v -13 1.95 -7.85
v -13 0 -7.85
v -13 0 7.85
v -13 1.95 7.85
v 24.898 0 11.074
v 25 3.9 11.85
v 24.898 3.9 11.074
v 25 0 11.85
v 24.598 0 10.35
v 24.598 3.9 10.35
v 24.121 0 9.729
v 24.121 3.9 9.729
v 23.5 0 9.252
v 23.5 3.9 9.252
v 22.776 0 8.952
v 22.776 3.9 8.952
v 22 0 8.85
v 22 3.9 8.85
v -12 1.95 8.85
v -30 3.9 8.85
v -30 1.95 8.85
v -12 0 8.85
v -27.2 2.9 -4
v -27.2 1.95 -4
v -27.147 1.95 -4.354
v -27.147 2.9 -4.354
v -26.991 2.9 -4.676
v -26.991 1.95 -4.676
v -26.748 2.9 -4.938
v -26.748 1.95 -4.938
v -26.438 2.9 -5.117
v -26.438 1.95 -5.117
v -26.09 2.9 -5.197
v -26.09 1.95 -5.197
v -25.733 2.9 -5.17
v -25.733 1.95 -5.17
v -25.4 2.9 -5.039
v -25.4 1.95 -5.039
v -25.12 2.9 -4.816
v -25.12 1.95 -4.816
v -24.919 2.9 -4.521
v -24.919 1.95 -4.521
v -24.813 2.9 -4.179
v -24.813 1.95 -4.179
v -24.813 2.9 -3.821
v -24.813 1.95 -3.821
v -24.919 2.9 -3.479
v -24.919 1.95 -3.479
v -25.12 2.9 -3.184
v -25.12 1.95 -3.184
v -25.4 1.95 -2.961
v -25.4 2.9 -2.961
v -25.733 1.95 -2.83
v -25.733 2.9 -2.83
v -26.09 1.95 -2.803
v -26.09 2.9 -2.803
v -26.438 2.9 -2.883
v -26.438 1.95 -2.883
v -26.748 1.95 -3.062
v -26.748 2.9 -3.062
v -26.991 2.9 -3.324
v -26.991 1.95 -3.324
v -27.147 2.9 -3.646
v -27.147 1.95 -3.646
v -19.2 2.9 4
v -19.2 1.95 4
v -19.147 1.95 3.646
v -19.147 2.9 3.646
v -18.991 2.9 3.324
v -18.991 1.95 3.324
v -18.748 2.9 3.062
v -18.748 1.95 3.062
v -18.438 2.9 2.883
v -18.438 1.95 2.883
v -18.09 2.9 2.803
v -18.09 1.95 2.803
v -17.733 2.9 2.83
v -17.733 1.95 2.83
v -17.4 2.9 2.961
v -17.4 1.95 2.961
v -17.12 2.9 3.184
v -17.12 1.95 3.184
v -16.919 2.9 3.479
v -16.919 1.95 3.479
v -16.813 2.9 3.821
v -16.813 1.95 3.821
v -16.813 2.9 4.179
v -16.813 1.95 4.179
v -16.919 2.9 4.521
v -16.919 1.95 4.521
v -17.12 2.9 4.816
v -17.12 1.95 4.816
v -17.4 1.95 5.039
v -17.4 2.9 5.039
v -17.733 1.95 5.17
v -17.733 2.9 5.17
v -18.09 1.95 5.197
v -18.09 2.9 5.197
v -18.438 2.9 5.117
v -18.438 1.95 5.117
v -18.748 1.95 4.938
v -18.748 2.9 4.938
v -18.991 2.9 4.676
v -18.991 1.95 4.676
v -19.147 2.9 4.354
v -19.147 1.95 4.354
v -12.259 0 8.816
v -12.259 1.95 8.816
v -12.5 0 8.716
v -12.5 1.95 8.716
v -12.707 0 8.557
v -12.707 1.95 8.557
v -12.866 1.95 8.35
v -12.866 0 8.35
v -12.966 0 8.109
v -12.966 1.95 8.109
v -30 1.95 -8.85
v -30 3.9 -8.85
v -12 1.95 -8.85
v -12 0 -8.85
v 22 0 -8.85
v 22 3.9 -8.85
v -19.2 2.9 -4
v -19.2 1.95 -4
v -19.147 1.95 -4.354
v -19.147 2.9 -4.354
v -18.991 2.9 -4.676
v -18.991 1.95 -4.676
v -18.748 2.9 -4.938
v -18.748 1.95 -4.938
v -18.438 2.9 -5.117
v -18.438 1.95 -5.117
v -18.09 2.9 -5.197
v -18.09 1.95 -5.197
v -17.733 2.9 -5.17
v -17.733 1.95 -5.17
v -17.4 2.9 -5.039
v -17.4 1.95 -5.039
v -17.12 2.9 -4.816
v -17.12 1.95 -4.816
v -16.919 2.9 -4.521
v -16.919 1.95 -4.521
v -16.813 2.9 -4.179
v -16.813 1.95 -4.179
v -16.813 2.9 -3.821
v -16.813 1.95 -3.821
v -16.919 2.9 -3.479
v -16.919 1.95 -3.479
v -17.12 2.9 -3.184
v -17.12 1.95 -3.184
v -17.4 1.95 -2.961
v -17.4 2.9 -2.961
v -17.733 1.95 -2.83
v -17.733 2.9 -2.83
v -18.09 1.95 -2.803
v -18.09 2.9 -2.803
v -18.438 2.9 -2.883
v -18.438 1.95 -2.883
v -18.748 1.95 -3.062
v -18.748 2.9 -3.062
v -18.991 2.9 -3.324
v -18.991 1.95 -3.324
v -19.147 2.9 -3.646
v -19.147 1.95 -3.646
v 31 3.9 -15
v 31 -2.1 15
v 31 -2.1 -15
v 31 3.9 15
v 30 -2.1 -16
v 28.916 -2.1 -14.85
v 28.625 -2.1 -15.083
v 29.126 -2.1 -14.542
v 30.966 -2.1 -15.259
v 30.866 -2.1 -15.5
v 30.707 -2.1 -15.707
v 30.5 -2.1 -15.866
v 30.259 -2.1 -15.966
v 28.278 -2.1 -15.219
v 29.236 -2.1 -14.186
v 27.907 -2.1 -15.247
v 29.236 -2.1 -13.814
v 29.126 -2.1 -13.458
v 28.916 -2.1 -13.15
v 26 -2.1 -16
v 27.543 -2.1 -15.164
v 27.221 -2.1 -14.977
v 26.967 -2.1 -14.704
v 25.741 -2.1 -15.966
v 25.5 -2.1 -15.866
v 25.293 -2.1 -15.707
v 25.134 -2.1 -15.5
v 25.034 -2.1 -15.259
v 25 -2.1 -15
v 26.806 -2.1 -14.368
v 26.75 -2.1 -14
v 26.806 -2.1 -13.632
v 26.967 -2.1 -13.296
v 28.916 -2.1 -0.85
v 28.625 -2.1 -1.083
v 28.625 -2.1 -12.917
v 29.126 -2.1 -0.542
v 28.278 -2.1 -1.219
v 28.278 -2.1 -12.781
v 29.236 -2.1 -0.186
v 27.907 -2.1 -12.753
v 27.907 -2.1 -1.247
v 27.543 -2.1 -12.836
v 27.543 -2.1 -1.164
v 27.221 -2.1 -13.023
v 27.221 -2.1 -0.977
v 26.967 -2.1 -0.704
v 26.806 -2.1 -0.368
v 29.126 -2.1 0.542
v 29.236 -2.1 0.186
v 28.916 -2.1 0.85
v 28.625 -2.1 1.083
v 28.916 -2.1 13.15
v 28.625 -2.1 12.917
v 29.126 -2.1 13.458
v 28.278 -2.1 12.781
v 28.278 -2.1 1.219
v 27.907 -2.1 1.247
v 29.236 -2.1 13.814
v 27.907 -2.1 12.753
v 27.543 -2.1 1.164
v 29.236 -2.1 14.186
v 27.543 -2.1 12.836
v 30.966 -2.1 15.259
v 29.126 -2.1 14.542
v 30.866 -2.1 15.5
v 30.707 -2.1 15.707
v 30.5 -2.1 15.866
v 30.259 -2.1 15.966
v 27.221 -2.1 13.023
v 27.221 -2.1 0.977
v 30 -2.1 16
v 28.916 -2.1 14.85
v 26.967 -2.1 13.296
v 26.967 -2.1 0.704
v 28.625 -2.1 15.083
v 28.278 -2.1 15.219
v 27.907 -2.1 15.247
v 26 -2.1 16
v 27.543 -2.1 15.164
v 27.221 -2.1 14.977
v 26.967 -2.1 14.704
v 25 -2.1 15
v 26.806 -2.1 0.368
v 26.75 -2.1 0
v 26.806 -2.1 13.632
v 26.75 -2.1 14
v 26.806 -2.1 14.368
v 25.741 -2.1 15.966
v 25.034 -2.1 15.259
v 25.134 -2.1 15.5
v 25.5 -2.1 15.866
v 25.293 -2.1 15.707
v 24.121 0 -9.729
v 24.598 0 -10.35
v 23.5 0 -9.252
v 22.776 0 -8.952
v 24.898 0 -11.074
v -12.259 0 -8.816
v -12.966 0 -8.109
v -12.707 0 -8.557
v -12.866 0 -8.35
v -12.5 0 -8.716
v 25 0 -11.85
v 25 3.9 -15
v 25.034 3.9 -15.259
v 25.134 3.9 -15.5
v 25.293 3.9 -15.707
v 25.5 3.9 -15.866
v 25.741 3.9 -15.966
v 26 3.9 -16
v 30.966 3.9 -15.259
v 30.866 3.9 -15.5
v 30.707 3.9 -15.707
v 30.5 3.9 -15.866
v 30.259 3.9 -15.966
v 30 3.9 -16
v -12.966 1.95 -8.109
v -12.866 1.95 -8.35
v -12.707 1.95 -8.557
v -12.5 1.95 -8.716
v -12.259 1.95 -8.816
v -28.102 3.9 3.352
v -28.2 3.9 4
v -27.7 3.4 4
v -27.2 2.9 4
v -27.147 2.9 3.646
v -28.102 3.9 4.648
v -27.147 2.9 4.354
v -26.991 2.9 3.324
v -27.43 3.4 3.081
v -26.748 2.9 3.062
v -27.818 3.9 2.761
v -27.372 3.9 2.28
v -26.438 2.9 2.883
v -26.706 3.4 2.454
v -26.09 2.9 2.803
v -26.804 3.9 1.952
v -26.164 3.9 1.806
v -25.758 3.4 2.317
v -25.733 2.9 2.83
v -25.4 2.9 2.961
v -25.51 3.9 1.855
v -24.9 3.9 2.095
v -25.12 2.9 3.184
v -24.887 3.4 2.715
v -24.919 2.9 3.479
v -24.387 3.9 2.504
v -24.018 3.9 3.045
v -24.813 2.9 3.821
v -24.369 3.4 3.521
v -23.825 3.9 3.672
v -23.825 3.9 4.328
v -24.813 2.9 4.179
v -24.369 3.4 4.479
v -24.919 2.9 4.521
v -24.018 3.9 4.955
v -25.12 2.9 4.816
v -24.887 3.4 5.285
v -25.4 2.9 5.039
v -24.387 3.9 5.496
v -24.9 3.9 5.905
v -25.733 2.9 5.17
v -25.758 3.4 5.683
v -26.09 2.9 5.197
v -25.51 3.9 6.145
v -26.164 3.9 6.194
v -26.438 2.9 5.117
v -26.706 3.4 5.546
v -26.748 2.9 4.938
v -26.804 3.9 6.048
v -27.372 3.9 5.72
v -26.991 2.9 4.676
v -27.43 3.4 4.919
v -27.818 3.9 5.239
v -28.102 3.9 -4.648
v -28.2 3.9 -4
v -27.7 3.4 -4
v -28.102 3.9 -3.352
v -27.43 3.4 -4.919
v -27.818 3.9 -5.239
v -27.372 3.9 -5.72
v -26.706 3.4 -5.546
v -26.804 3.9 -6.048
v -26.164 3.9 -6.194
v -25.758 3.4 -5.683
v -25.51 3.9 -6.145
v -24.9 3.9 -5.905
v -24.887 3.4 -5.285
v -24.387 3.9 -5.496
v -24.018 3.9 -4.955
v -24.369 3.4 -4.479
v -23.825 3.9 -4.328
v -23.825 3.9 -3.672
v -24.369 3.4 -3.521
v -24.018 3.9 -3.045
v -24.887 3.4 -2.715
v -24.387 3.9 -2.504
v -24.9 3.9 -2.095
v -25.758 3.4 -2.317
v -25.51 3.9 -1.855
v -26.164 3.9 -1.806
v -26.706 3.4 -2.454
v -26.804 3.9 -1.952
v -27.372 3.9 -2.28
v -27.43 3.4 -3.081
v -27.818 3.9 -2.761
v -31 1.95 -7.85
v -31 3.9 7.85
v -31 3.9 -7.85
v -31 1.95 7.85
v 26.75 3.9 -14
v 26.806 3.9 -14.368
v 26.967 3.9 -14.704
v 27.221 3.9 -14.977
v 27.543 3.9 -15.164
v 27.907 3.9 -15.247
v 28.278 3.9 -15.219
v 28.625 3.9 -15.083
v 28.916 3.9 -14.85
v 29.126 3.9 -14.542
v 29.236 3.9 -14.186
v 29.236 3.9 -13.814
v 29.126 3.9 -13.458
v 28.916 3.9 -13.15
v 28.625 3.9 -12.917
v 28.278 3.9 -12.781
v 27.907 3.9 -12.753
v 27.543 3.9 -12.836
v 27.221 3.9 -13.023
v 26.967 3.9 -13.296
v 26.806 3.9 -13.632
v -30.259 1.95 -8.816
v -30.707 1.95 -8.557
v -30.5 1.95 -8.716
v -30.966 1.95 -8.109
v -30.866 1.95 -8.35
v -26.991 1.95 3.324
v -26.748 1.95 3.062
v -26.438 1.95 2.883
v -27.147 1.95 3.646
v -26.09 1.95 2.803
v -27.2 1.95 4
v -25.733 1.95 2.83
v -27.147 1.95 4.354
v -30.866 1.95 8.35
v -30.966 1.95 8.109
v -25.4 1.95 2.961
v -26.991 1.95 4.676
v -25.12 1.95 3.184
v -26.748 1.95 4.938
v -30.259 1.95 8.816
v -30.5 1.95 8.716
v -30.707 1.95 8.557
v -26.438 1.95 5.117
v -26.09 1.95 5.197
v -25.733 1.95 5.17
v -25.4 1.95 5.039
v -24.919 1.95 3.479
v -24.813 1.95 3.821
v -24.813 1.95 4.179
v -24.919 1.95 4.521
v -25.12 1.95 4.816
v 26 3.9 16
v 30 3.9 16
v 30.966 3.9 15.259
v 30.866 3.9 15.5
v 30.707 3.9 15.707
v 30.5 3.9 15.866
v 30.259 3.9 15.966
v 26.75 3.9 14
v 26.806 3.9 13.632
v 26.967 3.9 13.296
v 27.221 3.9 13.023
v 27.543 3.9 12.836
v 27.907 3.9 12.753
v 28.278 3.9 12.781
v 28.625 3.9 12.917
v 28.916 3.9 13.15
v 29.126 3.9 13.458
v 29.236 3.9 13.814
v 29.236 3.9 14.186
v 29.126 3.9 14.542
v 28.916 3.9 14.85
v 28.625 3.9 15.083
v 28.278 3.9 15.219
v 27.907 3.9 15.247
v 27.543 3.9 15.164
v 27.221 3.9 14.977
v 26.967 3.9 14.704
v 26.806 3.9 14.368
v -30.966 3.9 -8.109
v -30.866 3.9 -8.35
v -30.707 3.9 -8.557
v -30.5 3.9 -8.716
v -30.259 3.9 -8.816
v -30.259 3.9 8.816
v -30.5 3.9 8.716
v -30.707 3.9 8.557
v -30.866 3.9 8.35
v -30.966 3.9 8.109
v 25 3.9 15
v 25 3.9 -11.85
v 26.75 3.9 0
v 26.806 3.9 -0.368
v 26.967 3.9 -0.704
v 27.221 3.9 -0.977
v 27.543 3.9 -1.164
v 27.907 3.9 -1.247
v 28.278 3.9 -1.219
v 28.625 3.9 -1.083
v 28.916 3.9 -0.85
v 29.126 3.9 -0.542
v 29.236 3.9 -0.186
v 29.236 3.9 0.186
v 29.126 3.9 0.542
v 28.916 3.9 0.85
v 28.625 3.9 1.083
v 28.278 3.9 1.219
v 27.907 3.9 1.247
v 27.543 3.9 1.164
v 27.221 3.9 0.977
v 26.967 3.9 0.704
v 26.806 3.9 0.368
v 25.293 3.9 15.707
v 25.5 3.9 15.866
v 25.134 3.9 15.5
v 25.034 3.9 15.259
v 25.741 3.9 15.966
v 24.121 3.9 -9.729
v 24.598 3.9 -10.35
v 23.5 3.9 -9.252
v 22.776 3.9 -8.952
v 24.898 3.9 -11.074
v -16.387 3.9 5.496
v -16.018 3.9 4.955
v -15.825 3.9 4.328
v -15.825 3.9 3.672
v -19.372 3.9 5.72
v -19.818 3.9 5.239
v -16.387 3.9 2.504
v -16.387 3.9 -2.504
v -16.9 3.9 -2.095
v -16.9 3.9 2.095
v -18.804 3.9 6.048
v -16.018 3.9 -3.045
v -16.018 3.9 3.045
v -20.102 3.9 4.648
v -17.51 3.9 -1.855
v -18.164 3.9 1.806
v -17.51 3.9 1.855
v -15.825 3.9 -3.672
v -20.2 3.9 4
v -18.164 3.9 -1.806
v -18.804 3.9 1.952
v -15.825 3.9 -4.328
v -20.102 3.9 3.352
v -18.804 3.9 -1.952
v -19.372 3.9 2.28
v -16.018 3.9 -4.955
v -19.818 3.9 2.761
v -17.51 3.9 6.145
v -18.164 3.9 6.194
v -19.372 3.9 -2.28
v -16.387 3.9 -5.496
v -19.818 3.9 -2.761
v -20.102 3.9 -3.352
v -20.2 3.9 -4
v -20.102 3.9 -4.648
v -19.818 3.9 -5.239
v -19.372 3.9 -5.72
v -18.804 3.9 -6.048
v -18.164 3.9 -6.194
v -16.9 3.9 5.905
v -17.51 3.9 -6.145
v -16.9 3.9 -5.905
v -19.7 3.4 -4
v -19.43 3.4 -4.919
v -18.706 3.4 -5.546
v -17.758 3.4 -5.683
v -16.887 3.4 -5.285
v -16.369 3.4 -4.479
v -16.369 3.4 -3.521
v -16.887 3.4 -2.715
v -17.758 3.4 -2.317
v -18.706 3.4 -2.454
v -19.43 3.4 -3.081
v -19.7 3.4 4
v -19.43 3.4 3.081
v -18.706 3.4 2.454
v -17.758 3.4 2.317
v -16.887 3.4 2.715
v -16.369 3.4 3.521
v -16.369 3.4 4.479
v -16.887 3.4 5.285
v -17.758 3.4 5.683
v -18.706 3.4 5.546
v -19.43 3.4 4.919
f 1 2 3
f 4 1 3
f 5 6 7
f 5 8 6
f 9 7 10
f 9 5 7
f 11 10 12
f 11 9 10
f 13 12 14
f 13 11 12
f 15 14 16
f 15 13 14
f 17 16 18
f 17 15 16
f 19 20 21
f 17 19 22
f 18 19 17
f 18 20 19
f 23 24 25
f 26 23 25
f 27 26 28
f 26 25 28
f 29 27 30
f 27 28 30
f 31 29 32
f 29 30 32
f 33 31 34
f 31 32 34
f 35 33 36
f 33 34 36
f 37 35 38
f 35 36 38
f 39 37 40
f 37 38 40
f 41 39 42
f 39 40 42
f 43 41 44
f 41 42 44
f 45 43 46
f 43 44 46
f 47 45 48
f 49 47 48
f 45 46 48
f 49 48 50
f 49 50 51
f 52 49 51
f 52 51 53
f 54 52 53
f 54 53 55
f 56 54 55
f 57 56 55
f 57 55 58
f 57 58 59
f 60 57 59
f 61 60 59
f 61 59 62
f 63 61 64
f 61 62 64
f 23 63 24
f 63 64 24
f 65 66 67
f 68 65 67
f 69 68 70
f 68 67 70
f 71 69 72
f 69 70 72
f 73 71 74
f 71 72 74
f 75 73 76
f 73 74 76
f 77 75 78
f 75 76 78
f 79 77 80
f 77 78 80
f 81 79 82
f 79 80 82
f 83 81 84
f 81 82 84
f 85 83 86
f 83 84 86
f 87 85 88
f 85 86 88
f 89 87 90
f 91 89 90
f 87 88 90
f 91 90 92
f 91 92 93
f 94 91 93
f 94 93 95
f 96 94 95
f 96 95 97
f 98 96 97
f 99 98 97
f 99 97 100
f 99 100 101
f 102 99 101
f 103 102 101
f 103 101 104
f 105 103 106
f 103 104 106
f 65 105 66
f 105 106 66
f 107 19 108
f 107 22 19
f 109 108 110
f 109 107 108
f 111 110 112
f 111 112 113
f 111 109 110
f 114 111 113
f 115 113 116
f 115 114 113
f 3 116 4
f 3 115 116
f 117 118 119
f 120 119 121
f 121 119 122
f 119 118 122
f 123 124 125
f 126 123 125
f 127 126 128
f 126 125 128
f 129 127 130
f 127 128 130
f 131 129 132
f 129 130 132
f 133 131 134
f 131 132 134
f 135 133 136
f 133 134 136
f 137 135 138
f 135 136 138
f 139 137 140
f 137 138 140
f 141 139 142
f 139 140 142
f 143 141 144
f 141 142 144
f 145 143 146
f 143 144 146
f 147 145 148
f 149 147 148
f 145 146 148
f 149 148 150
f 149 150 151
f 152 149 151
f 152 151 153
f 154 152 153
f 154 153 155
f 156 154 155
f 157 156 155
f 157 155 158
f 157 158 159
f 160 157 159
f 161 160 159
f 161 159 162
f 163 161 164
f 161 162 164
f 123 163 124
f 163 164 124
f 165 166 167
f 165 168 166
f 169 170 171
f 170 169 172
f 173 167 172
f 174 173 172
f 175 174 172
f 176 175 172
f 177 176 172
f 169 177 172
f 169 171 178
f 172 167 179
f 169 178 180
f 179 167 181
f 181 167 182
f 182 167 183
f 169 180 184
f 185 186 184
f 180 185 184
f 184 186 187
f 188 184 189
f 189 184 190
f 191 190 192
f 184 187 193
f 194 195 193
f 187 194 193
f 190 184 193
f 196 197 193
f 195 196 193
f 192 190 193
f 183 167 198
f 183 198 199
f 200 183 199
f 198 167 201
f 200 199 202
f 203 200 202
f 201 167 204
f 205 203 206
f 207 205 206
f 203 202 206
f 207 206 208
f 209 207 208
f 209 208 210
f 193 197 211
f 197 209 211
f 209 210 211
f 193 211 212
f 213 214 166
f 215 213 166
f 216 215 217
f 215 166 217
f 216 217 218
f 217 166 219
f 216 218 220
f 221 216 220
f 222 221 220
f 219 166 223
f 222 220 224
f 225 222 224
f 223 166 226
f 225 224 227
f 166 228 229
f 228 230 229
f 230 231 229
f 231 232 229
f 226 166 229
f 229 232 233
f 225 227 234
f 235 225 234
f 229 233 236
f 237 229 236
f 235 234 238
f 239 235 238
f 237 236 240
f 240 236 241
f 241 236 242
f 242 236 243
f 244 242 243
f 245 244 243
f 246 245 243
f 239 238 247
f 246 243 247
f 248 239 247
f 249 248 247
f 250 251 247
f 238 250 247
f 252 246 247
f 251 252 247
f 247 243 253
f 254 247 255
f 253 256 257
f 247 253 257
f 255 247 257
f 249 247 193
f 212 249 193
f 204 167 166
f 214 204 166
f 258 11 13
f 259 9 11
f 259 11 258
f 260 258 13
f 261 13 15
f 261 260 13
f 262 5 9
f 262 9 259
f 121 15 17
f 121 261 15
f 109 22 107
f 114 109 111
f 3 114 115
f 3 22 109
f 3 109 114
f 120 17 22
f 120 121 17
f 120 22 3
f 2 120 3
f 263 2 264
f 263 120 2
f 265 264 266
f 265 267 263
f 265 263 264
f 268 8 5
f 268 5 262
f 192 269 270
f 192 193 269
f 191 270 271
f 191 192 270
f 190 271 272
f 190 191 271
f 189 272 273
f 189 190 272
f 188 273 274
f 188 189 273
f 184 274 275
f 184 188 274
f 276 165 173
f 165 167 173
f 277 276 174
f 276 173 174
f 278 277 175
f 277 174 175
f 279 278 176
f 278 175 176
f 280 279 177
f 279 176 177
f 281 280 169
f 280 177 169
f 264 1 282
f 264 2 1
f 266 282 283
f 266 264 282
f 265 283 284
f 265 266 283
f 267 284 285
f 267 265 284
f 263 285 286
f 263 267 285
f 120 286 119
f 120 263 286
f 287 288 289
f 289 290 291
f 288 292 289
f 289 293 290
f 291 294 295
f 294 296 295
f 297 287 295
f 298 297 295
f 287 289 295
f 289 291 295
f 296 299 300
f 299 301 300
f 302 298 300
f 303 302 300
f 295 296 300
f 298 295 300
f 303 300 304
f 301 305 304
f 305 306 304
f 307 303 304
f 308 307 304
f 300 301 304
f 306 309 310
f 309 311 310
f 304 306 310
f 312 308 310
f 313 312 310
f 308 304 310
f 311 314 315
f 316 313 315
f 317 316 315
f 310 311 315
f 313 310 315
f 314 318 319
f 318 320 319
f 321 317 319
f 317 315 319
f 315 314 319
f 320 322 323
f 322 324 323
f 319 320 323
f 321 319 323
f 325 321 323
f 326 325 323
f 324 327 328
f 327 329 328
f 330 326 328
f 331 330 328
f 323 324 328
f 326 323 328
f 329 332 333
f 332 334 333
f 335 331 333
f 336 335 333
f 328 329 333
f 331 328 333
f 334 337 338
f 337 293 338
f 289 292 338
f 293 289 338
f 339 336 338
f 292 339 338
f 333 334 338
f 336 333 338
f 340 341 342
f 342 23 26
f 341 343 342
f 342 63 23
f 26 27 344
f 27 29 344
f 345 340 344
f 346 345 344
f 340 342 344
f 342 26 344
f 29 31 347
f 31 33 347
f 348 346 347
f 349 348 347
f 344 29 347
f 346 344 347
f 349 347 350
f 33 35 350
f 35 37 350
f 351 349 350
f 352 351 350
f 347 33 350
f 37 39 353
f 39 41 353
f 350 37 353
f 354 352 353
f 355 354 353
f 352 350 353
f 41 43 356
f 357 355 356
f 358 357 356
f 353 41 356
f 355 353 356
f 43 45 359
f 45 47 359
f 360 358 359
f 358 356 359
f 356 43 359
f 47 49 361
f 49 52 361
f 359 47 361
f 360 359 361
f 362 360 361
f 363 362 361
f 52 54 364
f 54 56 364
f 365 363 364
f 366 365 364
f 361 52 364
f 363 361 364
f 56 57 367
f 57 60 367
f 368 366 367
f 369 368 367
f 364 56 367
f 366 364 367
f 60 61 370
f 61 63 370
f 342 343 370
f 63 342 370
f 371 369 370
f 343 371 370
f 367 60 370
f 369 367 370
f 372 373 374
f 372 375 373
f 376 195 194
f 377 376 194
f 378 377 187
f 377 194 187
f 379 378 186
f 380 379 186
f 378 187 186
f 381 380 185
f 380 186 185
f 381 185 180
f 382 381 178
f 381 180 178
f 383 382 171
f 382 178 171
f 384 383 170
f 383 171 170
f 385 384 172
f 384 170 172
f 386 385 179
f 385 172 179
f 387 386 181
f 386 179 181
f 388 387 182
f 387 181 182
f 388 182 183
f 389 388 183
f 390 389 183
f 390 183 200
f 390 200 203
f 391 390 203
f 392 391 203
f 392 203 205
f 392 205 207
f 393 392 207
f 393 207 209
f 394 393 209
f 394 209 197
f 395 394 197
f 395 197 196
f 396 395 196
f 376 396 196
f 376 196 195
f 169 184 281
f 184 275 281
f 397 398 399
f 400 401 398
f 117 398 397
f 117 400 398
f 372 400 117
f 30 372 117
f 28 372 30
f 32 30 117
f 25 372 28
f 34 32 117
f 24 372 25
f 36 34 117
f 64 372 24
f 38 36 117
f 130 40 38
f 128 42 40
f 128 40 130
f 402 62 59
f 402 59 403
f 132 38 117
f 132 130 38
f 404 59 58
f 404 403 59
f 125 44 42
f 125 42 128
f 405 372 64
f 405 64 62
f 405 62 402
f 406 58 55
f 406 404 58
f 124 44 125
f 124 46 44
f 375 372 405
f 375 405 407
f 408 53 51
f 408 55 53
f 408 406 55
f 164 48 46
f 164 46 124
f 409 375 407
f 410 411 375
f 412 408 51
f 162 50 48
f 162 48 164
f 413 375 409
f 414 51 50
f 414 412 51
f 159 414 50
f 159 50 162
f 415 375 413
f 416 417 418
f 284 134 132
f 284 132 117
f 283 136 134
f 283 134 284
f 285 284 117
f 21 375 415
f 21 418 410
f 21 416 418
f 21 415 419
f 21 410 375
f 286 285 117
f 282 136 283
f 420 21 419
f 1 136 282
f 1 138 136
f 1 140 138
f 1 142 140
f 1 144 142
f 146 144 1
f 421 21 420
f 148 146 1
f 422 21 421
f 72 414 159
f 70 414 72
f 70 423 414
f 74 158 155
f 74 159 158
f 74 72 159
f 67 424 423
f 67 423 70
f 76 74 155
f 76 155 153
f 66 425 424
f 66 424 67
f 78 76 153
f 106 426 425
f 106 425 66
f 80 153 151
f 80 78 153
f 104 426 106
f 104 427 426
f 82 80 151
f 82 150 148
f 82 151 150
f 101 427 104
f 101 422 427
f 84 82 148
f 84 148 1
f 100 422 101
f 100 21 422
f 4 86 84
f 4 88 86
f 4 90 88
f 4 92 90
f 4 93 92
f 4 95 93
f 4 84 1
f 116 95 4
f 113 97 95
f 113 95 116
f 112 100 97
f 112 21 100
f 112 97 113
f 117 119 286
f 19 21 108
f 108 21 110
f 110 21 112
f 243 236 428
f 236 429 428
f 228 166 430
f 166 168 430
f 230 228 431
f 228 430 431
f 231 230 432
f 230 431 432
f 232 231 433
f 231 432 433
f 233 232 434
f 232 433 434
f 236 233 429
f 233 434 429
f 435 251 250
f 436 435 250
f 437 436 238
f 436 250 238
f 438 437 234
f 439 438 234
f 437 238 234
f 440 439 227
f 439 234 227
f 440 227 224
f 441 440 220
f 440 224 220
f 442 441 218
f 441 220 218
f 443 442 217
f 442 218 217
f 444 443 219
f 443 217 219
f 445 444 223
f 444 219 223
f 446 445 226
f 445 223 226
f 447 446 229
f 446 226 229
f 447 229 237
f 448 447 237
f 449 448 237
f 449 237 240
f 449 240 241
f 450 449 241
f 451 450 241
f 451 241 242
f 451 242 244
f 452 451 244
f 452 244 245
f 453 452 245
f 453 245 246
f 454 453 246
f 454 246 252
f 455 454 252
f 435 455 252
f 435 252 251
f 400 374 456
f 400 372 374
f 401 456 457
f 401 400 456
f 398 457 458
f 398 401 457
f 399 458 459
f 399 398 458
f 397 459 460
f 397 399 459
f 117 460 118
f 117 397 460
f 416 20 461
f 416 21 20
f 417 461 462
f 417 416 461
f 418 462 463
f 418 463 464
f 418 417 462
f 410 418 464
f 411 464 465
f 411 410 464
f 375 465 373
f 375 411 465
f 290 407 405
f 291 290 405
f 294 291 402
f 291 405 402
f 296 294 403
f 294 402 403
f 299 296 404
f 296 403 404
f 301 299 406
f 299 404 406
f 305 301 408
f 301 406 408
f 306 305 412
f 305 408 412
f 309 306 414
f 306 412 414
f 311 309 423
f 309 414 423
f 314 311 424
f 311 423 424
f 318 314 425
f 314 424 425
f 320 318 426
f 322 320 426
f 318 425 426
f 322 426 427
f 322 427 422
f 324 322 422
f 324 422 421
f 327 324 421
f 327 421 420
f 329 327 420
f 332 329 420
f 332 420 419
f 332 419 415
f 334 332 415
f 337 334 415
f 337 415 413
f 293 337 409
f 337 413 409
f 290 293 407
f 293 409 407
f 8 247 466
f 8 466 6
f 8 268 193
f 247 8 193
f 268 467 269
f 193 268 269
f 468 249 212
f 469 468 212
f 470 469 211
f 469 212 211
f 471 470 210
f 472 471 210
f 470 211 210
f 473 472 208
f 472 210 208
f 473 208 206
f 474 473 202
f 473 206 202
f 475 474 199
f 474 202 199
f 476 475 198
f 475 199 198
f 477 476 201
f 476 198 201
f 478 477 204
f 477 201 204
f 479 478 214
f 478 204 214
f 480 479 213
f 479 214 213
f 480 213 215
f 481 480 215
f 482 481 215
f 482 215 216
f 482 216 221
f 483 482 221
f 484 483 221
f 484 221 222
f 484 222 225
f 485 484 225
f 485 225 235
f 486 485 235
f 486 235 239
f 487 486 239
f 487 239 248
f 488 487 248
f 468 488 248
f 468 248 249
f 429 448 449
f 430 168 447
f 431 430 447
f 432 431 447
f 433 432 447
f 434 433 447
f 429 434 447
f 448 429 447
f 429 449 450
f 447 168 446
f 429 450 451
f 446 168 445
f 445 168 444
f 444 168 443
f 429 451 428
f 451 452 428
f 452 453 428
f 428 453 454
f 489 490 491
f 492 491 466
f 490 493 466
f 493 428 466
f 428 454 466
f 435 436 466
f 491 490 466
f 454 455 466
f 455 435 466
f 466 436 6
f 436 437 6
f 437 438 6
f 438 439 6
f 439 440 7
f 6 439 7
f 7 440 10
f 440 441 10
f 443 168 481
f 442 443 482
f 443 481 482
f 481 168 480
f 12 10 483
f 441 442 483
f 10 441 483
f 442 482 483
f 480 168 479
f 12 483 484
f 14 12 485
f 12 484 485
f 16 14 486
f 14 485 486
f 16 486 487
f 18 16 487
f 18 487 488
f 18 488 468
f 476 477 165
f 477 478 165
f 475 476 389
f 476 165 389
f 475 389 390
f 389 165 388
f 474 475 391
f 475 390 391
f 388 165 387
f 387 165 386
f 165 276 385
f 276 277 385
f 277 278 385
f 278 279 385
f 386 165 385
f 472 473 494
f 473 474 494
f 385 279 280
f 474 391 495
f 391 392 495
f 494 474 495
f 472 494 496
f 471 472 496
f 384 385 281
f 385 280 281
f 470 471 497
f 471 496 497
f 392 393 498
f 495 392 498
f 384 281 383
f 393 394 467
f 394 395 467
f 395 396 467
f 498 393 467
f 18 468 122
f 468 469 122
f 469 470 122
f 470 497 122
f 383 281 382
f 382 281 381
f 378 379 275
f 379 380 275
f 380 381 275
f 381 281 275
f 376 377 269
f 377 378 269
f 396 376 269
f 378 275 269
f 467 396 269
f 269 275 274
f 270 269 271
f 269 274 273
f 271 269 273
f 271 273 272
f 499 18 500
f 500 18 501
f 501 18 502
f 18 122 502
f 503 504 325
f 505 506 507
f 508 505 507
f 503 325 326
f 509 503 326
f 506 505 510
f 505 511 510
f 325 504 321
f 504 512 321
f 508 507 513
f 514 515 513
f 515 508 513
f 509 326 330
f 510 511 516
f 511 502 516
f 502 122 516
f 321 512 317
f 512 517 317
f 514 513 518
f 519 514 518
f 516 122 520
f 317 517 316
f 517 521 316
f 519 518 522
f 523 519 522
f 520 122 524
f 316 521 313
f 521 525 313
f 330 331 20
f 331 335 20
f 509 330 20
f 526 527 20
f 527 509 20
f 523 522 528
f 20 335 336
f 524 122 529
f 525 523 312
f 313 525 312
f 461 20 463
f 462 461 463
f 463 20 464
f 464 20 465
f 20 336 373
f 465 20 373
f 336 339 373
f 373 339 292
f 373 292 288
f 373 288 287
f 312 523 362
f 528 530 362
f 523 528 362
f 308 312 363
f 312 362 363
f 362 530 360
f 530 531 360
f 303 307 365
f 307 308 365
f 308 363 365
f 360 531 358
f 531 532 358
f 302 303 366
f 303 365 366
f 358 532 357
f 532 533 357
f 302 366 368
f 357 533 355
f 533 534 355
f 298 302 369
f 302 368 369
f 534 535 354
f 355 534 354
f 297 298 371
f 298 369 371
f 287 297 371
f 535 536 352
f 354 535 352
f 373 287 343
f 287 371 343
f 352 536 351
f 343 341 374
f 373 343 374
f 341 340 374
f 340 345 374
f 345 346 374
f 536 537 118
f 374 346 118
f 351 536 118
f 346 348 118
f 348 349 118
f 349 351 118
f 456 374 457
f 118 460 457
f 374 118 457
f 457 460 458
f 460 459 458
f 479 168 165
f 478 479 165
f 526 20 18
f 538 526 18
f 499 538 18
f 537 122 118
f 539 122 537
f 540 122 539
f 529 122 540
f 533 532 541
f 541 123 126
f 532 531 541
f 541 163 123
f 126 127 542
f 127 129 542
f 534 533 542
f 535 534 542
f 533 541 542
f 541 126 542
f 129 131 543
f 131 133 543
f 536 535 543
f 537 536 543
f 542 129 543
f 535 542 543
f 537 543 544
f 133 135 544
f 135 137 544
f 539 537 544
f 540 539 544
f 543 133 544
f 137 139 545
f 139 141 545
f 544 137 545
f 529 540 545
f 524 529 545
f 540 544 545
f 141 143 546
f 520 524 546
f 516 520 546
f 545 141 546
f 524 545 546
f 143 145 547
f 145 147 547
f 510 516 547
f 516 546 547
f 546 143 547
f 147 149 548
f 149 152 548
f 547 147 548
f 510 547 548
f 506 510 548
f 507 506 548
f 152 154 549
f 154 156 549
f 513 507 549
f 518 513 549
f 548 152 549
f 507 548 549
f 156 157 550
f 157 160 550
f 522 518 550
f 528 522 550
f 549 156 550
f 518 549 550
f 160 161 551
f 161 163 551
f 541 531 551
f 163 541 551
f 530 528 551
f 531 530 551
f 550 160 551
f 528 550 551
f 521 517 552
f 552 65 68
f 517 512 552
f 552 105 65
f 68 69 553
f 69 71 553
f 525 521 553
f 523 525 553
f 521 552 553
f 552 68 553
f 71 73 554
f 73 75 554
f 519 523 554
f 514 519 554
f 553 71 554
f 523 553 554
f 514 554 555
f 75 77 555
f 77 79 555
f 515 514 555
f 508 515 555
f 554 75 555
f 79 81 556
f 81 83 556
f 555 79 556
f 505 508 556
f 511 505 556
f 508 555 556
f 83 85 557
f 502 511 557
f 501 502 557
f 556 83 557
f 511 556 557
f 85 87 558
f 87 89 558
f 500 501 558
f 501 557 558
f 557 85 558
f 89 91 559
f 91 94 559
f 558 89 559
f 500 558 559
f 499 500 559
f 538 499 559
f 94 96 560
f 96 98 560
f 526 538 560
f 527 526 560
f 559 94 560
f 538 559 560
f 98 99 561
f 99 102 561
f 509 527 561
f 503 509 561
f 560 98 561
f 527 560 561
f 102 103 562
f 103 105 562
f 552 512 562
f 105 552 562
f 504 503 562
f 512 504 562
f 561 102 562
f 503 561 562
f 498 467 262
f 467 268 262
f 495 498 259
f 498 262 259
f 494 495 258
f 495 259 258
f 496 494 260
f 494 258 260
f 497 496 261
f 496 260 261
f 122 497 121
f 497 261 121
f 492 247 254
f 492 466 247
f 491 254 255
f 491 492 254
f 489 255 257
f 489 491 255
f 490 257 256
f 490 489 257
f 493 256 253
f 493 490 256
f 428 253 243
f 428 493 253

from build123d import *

# Parameters (mm, degrees)
BOSS_EXTRUDE1_DEPTH                                 = 3.9
BOSS_EXTRUDE2_DEPTH                                 = 2.1
CSK_FOR_M2_COUNTERSUNK_FLAT_HEAD_SCREW1_D           = 2.4
CSK_FOR_M2_COUNTERSUNK_FLAT_HEAD_SCREW1_CSINK_D     = 4.4
CSK_FOR_M2_COUNTERSUNK_FLAT_HEAD_SCREW1_CSINK_ANGLE = 90
LPATTERN1_COUNT                                     = 2
LPATTERN1_PITCH                                     = 8
LPATTERN1_COUNT_DIR2                                = 2
LPATTERN1_PITCH_DIR2                                = 8
SKETCH7_W                                           = 8
SKETCH7_H                                           = 6
CUT_EXTRUDE1_DEPTH                                  = 36.397740041
SKETCH10_W                                          = 18
SKETCH10_H                                          = 18
CUT_EXTRUDE2_DEPTH                                  = 1.95
SKETCH14_W                                          = 8
SKETCH14_H                                          = 1
CUT_EXTRUDE3_DEPTH                                  = 36.11983058
M3_TAPPED_HOLE1_D                                   = 2.5
M3_TAPPED_HOLE1_DEPTH                               = 6.748924226
M3_TAPPED_HOLE1_TIP                                 = 0.751075774
SKETCH15_W                                          = 56
SKETCH15_H                                          = 3.05
CUT_EXTRUDE4_DEPTH                                  = 36.397740041
FILLET5_R                                           = 1
FILLET7_R                                           = 3


with BuildPart() as part:
    # Sketch1 → Boss-Extrude1 (new body)
    with BuildSketch(Plane(origin=(0, 0, 0), x_dir=(1, 0, 0), z_dir=(0, 1, 0))):
        Polygon((22, 11.9), (25, 11.9), (25, 16), (28, 16), (31, 16), (31, -16), (28, -16), (25, -16), (25, -11.9), (22, -11.9), (-31, -11.9), (-31, 11.9), align=None)
    extrude(amount=BOSS_EXTRUDE1_DEPTH)

    # Sketch6 → Boss-Extrude2 (add)
    with BuildSketch(Plane.XZ):
        Polygon((25, 11.9), (25, 16), (28, 16), (31, 16), (31, -16), (28, -16), (25, -16), (25, -11.9), align=None)
    extrude(amount=BOSS_EXTRUDE2_DEPTH)

    # CSK for M2 Countersunk Flat Head Screw1 (through all)
    with Locations(Plane(origin=(0, 3.9, 0), x_dir=(1, 0, 0), z_dir=(0, 1, 0))):
        with Locations((-18, 4)):
            csk_for_m2_countersunk_flat_head_screw1 = CounterSinkHole(CSK_FOR_M2_COUNTERSUNK_FLAT_HEAD_SCREW1_D / 2, CSK_FOR_M2_COUNTERSUNK_FLAT_HEAD_SCREW1_CSINK_D / 2, counter_sink_angle=CSK_FOR_M2_COUNTERSUNK_FLAT_HEAD_SCREW1_CSINK_ANGLE)

    # LPattern1: CSK for M2 Countersunk Flat Head Screw1 2 × 2
    with Locations(*[(-i * LPATTERN1_PITCH, 0, j * LPATTERN1_PITCH_DIR2) for i in range(LPATTERN1_COUNT) for j in range(LPATTERN1_COUNT_DIR2) if (i, j) != (0, 0)]):
        add(csk_for_m2_countersunk_flat_head_screw1, mode=Mode.SUBTRACT)

    # Sketch7 → Cut-Extrude1 (cut, through all)
    with BuildSketch(Plane(origin=(0, 3.9, 0), x_dir=(1, 0, 0), z_dir=(0, 1, 0))):
        with Locations((-27, 12)):
            Rectangle(SKETCH7_W, SKETCH7_H)
        with Locations((-27, -12)):
            Rectangle(SKETCH7_W, SKETCH7_H)
    extrude(amount=-CUT_EXTRUDE1_DEPTH, mode=Mode.SUBTRACT)

    # Sketch10 → Cut-Extrude2 (cut)
    with BuildSketch(Plane.XZ):
        with Locations((-22, 0)):
            Rectangle(SKETCH10_W, SKETCH10_H)
    extrude(amount=-CUT_EXTRUDE2_DEPTH, mode=Mode.SUBTRACT)

    # Sketch14 → Cut-Extrude3 (cut, through all)
    with BuildSketch(Plane.XZ.offset(-1.95)):
        with Locations((-27, -9.45)):
            Rectangle(SKETCH14_W, SKETCH14_H)
        with Locations((-27, 9.45)):
            Rectangle(SKETCH14_W, SKETCH14_H)
    extrude(amount=-CUT_EXTRUDE3_DEPTH, mode=Mode.SUBTRACT)

    # M3 Tapped Hole1
    with Locations(Plane(origin=(0, 3.9, 0), x_dir=(1, 0, 0), z_dir=(0, 1, 0))):
        with Locations((28, 14), (28, -14), (28, 0)):
            Hole(M3_TAPPED_HOLE1_D / 2, depth=M3_TAPPED_HOLE1_DEPTH)
            with Locations((0, 0, -(M3_TAPPED_HOLE1_DEPTH + M3_TAPPED_HOLE1_TIP / 2))):  # 118° drill point
                Cone(0, M3_TAPPED_HOLE1_D / 2, M3_TAPPED_HOLE1_TIP, mode=Mode.SUBTRACT)

    # Sketch15 → Cut-Extrude4 (cut, through all)
    with BuildSketch(Plane(origin=(0, 3.9, 0), x_dir=(1, 0, 0), z_dir=(0, 1, 0))):
        with Locations((-3, 10.375)):
            Rectangle(SKETCH15_W, SKETCH15_H)
        with Locations((-3, -10.375)):
            Rectangle(SKETCH15_W, SKETCH15_H)
    extrude(amount=-CUT_EXTRUDE4_DEPTH, mode=Mode.SUBTRACT)

    # Fillet5
    fillet5_edges = [part.edges().sort_by_distance(p)[0] for p in [
        (25, 0.9, -16),
        (31, 0.9, -16),
        (31, 0.9, 16),
        (25, 0.9, 16),
        (-13, 0.975, 8.85),
        (-13, 0.975, -8.85),
        (-31, 2.925, -8.85),
        (-31, 2.925, 8.85),
    ]]
    fillet(fillet5_edges, radius=FILLET5_R)

    # Fillet7
    fillet7_edges = [part.edges().sort_by_distance(p)[0] for p in [
        (25, 1.95, -8.85),
        (25, 1.95, 8.85),
    ]]
    fillet(fillet7_edges, radius=FILLET7_R)


solid = part.part
